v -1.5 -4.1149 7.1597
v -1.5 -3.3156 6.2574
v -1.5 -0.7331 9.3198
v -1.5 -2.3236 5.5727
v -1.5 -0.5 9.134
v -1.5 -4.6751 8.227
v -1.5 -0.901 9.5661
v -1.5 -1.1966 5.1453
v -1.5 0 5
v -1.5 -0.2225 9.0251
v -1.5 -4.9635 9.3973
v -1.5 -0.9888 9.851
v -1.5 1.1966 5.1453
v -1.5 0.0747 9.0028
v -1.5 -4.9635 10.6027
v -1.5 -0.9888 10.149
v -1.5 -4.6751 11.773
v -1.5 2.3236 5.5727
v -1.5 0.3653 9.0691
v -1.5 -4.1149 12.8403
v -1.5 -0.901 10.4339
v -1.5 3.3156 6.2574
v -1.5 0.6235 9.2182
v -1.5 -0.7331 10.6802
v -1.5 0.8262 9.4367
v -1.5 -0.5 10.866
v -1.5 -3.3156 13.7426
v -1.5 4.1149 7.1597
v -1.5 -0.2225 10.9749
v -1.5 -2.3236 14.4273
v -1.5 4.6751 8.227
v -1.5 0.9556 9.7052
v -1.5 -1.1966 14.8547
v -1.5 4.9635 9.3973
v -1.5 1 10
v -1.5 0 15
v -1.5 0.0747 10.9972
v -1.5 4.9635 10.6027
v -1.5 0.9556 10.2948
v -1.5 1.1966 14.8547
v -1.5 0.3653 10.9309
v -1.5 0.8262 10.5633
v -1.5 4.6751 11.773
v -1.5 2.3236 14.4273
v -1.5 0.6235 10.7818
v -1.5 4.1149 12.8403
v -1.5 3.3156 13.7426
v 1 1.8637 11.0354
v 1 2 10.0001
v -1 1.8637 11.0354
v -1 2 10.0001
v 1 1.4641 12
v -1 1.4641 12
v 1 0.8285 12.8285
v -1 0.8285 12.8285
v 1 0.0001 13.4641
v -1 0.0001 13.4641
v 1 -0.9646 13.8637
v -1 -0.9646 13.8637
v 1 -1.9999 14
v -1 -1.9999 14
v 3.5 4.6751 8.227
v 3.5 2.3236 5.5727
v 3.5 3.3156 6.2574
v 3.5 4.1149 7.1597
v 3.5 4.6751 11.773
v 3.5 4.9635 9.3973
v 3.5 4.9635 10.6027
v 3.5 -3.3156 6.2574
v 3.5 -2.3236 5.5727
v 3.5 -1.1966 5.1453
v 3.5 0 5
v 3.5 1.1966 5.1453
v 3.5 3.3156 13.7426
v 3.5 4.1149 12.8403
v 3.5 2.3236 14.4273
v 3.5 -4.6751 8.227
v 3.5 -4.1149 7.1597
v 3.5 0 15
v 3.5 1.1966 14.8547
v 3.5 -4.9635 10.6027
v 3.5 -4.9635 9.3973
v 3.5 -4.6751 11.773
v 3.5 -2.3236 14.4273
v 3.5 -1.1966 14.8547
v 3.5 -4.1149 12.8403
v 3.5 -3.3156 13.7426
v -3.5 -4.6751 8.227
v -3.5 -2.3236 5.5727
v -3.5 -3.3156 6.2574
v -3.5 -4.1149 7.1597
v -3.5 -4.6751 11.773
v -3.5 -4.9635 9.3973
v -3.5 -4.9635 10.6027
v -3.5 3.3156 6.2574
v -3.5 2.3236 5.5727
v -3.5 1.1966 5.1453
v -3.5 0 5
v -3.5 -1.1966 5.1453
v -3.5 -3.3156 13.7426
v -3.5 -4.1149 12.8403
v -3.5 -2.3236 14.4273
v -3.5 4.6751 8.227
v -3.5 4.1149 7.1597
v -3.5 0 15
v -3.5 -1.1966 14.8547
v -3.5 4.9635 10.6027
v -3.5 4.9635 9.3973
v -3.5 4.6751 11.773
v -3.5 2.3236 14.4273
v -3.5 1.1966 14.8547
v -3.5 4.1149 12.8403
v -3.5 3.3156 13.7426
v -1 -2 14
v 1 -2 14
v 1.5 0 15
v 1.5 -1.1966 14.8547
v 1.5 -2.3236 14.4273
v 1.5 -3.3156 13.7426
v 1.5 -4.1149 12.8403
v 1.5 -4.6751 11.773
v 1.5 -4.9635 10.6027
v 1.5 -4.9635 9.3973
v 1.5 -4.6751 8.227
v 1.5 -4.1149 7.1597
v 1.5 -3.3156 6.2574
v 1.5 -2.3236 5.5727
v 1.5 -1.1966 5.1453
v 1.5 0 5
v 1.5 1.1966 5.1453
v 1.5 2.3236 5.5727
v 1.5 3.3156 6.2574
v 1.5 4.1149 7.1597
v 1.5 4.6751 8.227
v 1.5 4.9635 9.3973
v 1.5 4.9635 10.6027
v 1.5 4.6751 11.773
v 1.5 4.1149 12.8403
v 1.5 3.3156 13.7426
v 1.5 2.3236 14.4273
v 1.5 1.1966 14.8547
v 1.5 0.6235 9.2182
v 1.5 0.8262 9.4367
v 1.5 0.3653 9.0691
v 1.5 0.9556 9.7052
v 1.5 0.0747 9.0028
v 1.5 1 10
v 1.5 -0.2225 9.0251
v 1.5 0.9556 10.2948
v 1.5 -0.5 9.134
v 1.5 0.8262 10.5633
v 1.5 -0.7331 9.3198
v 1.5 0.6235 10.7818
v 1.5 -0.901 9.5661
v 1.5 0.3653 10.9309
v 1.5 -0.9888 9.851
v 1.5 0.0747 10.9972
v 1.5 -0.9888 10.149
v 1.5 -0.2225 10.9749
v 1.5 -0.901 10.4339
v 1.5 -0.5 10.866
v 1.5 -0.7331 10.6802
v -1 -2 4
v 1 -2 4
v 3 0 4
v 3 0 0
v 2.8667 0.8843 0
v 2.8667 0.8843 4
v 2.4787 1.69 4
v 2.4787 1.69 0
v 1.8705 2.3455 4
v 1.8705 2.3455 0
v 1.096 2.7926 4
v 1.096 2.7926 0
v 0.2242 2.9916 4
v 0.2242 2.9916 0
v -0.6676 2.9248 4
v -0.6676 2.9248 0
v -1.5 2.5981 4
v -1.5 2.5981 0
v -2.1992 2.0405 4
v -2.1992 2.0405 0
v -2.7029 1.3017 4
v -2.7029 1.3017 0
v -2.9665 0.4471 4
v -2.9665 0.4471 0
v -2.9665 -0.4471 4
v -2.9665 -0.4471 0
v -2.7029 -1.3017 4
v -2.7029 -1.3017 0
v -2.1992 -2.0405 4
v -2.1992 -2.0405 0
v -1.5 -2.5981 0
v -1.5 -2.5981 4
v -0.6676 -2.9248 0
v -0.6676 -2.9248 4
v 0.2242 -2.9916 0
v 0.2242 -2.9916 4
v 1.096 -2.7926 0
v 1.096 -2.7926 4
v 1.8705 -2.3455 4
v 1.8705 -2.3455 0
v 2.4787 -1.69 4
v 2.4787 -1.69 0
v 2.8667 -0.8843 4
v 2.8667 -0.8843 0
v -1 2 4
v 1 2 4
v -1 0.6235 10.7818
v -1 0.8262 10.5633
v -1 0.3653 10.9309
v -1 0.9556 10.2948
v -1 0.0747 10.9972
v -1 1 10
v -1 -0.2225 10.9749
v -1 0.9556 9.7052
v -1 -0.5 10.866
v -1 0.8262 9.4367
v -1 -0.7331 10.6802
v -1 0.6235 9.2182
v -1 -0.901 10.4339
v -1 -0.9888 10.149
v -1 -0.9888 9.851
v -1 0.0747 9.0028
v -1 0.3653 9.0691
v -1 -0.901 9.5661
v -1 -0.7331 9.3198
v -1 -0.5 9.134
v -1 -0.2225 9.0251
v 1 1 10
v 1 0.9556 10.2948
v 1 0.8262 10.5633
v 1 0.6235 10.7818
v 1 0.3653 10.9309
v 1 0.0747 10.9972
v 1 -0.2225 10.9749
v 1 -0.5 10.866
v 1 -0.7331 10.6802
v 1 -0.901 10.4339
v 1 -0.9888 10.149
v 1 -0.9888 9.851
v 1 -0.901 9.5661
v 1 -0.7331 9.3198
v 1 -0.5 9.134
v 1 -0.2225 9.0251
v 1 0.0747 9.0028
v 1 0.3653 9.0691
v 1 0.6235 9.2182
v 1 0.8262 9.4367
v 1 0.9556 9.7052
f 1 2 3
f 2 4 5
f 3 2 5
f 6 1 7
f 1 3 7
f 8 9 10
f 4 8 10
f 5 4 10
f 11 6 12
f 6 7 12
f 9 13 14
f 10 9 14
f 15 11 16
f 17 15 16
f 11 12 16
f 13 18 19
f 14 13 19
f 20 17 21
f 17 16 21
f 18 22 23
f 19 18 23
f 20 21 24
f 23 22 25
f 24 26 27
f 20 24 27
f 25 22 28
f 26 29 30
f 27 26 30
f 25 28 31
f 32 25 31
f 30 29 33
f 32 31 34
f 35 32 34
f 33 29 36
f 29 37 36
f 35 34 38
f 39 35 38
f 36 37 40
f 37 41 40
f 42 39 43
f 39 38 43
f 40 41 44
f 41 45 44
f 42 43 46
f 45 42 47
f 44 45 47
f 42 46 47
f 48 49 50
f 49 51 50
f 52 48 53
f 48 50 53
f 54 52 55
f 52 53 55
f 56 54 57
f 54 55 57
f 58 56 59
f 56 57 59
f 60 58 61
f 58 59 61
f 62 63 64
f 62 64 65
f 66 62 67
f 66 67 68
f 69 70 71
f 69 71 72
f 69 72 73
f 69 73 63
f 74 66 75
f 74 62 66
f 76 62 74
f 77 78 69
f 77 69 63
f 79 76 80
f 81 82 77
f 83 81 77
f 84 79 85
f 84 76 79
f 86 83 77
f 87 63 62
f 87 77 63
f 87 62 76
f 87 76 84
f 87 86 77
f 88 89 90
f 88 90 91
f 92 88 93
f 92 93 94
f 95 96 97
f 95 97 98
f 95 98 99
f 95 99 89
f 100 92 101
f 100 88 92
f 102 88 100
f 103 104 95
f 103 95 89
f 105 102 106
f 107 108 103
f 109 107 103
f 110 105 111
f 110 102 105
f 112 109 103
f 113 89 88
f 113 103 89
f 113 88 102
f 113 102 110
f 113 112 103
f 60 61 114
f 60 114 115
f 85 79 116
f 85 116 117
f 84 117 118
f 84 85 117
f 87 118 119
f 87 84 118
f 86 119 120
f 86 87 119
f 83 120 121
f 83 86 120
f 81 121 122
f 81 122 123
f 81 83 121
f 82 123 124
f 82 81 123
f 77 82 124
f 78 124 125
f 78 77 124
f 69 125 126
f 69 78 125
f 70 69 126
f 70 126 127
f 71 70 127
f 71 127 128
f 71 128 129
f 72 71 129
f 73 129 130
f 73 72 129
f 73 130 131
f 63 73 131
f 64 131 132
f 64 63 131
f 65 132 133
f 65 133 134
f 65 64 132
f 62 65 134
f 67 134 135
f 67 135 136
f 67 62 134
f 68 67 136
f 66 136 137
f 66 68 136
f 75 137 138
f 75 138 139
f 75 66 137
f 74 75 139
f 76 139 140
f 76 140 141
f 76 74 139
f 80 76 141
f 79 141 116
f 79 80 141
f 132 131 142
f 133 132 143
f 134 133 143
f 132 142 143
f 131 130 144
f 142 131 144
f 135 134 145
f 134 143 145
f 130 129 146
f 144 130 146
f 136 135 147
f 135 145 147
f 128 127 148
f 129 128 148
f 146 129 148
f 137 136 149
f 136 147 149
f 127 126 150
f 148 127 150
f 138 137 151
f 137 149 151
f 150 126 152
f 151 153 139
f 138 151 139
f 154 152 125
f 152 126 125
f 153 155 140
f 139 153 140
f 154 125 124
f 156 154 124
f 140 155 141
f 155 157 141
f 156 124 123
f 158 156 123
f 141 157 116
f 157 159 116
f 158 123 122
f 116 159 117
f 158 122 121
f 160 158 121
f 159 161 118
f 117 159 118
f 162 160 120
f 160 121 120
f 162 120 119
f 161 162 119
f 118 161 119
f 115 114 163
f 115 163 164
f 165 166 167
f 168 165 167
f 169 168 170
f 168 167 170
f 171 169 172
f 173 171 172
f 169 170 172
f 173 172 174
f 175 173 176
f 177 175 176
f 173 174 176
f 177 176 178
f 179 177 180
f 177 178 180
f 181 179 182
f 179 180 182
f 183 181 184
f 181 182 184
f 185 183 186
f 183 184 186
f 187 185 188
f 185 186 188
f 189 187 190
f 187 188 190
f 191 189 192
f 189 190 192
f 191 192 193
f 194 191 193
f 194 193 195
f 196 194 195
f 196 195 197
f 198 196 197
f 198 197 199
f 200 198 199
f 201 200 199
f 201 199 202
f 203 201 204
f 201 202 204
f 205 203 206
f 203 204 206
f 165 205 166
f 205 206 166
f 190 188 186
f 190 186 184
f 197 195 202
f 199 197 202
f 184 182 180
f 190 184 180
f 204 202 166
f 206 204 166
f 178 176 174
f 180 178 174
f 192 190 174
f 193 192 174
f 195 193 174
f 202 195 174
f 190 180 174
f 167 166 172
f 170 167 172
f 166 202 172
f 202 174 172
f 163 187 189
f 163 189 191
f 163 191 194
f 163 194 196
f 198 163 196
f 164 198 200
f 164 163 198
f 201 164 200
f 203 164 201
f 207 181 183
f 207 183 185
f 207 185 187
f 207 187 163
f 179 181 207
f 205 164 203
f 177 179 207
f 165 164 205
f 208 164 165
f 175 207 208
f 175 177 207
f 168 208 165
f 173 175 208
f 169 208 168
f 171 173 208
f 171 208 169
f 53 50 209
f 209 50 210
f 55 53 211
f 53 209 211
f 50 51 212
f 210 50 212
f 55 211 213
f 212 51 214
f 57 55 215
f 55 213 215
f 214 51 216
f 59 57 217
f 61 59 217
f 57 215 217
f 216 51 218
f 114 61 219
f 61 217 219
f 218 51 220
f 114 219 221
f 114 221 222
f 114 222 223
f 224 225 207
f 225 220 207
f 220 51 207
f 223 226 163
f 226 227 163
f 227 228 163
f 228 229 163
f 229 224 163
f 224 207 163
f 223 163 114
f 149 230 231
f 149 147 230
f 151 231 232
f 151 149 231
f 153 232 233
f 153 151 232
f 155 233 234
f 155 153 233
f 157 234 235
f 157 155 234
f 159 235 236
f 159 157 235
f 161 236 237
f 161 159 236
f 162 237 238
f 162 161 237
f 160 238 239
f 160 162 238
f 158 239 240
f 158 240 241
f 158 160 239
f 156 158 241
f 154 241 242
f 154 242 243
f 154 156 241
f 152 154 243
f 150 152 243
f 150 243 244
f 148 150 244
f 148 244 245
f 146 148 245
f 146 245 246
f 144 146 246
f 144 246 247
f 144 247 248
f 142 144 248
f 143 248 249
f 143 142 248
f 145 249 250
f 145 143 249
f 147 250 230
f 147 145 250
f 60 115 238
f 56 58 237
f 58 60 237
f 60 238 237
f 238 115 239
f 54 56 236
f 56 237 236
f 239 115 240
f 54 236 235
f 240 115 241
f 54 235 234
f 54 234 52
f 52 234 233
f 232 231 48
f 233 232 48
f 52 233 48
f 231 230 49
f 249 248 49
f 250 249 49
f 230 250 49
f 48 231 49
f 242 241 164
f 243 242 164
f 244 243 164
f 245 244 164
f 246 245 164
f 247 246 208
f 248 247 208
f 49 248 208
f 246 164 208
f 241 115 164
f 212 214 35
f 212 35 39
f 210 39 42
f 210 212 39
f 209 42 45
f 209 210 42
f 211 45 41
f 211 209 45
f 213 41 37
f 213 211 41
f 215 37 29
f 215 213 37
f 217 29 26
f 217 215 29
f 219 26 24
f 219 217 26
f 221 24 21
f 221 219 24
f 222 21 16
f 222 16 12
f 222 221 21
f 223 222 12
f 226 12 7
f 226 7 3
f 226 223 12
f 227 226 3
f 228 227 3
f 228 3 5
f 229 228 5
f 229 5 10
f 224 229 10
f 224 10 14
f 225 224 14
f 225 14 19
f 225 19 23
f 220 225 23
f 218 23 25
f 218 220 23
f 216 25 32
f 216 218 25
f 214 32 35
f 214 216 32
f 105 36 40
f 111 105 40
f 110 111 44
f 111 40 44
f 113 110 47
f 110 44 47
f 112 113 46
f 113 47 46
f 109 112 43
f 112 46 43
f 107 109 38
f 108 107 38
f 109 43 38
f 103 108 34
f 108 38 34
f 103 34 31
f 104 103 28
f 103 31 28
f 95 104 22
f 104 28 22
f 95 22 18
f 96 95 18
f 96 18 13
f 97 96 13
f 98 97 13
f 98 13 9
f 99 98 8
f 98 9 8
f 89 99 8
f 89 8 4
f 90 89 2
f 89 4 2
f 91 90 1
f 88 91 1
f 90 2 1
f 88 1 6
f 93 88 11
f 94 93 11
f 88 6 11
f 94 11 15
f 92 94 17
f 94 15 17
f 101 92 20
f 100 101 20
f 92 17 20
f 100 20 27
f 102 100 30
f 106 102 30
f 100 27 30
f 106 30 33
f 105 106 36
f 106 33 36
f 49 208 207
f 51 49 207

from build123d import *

# Parameters (mm, degrees)
SKETCH_1_R      = 3
EXTRUDE_1_DEPTH = 4
EXTRUDE_2_DEPTH = 14
SKETCH_4_R      = 1
EXTRUDE_3_DEPTH = 1.5
SKETCH_5_R      = 5
EXTRUDE_4_DEPTH = 2
EXTRUDE_START   = 2
SKETCH_6_R      = 5
EXTRUDE_5_DEPTH = 2
FILLET_1_R      = 4


with BuildPart() as part:
    # 草图1 → 凸台-拉伸1 (new body)
    with BuildSketch(Plane.XY):
        Circle(SKETCH_1_R)
    extrude(amount=EXTRUDE_1_DEPTH)

    # 草图2 → 凸台-拉伸2 (add)
    with BuildSketch(Plane.XY):
        Polygon((1, 0), (1, 2), (-1, 2), (-1, -2), (1, -2), align=None)
    extrude(amount=EXTRUDE_2_DEPTH)

    # 草图4 → 凸台-拉伸3 (add, symmetric)
    with BuildSketch(Plane(origin=(0, 0, 0), x_dir=(0, 0, -1), z_dir=(1, 0, 0))):
        with Locations(Location((-10, 0, 0), (0, 0, 90))):
            Circle(SKETCH_4_R)
    extrude(amount=EXTRUDE_3_DEPTH, both=True)

    # 草图5 → 凸台-拉伸4 (add)
    with BuildSketch(Plane.ZY.offset(1.5)):
        with Locations((10, 0)):
            Circle(SKETCH_5_R)
    extrude(amount=EXTRUDE_4_DEPTH)

    # 草图6 → 凸台-拉伸5 (add)
    with BuildSketch(Plane(origin=(1.5, 0, 0), x_dir=(0, 0, -1), z_dir=(1, 0, 0)).offset(EXTRUDE_START)):
        with Locations(Location((-10, 0, 0), (0, 0, 180))):
            Circle(SKETCH_6_R)
    extrude(amount=-EXTRUDE_5_DEPTH)

    # 圆角1
    fillet_1_edges = [part.edges().sort_by_distance(p)[0] for p in [
        (0, 2, 14),
    ]]
    fillet(fillet_1_edges, radius=FILLET_1_R - 0.0001)  # a hair under: the kernel refuses the full size


solid = part.part
